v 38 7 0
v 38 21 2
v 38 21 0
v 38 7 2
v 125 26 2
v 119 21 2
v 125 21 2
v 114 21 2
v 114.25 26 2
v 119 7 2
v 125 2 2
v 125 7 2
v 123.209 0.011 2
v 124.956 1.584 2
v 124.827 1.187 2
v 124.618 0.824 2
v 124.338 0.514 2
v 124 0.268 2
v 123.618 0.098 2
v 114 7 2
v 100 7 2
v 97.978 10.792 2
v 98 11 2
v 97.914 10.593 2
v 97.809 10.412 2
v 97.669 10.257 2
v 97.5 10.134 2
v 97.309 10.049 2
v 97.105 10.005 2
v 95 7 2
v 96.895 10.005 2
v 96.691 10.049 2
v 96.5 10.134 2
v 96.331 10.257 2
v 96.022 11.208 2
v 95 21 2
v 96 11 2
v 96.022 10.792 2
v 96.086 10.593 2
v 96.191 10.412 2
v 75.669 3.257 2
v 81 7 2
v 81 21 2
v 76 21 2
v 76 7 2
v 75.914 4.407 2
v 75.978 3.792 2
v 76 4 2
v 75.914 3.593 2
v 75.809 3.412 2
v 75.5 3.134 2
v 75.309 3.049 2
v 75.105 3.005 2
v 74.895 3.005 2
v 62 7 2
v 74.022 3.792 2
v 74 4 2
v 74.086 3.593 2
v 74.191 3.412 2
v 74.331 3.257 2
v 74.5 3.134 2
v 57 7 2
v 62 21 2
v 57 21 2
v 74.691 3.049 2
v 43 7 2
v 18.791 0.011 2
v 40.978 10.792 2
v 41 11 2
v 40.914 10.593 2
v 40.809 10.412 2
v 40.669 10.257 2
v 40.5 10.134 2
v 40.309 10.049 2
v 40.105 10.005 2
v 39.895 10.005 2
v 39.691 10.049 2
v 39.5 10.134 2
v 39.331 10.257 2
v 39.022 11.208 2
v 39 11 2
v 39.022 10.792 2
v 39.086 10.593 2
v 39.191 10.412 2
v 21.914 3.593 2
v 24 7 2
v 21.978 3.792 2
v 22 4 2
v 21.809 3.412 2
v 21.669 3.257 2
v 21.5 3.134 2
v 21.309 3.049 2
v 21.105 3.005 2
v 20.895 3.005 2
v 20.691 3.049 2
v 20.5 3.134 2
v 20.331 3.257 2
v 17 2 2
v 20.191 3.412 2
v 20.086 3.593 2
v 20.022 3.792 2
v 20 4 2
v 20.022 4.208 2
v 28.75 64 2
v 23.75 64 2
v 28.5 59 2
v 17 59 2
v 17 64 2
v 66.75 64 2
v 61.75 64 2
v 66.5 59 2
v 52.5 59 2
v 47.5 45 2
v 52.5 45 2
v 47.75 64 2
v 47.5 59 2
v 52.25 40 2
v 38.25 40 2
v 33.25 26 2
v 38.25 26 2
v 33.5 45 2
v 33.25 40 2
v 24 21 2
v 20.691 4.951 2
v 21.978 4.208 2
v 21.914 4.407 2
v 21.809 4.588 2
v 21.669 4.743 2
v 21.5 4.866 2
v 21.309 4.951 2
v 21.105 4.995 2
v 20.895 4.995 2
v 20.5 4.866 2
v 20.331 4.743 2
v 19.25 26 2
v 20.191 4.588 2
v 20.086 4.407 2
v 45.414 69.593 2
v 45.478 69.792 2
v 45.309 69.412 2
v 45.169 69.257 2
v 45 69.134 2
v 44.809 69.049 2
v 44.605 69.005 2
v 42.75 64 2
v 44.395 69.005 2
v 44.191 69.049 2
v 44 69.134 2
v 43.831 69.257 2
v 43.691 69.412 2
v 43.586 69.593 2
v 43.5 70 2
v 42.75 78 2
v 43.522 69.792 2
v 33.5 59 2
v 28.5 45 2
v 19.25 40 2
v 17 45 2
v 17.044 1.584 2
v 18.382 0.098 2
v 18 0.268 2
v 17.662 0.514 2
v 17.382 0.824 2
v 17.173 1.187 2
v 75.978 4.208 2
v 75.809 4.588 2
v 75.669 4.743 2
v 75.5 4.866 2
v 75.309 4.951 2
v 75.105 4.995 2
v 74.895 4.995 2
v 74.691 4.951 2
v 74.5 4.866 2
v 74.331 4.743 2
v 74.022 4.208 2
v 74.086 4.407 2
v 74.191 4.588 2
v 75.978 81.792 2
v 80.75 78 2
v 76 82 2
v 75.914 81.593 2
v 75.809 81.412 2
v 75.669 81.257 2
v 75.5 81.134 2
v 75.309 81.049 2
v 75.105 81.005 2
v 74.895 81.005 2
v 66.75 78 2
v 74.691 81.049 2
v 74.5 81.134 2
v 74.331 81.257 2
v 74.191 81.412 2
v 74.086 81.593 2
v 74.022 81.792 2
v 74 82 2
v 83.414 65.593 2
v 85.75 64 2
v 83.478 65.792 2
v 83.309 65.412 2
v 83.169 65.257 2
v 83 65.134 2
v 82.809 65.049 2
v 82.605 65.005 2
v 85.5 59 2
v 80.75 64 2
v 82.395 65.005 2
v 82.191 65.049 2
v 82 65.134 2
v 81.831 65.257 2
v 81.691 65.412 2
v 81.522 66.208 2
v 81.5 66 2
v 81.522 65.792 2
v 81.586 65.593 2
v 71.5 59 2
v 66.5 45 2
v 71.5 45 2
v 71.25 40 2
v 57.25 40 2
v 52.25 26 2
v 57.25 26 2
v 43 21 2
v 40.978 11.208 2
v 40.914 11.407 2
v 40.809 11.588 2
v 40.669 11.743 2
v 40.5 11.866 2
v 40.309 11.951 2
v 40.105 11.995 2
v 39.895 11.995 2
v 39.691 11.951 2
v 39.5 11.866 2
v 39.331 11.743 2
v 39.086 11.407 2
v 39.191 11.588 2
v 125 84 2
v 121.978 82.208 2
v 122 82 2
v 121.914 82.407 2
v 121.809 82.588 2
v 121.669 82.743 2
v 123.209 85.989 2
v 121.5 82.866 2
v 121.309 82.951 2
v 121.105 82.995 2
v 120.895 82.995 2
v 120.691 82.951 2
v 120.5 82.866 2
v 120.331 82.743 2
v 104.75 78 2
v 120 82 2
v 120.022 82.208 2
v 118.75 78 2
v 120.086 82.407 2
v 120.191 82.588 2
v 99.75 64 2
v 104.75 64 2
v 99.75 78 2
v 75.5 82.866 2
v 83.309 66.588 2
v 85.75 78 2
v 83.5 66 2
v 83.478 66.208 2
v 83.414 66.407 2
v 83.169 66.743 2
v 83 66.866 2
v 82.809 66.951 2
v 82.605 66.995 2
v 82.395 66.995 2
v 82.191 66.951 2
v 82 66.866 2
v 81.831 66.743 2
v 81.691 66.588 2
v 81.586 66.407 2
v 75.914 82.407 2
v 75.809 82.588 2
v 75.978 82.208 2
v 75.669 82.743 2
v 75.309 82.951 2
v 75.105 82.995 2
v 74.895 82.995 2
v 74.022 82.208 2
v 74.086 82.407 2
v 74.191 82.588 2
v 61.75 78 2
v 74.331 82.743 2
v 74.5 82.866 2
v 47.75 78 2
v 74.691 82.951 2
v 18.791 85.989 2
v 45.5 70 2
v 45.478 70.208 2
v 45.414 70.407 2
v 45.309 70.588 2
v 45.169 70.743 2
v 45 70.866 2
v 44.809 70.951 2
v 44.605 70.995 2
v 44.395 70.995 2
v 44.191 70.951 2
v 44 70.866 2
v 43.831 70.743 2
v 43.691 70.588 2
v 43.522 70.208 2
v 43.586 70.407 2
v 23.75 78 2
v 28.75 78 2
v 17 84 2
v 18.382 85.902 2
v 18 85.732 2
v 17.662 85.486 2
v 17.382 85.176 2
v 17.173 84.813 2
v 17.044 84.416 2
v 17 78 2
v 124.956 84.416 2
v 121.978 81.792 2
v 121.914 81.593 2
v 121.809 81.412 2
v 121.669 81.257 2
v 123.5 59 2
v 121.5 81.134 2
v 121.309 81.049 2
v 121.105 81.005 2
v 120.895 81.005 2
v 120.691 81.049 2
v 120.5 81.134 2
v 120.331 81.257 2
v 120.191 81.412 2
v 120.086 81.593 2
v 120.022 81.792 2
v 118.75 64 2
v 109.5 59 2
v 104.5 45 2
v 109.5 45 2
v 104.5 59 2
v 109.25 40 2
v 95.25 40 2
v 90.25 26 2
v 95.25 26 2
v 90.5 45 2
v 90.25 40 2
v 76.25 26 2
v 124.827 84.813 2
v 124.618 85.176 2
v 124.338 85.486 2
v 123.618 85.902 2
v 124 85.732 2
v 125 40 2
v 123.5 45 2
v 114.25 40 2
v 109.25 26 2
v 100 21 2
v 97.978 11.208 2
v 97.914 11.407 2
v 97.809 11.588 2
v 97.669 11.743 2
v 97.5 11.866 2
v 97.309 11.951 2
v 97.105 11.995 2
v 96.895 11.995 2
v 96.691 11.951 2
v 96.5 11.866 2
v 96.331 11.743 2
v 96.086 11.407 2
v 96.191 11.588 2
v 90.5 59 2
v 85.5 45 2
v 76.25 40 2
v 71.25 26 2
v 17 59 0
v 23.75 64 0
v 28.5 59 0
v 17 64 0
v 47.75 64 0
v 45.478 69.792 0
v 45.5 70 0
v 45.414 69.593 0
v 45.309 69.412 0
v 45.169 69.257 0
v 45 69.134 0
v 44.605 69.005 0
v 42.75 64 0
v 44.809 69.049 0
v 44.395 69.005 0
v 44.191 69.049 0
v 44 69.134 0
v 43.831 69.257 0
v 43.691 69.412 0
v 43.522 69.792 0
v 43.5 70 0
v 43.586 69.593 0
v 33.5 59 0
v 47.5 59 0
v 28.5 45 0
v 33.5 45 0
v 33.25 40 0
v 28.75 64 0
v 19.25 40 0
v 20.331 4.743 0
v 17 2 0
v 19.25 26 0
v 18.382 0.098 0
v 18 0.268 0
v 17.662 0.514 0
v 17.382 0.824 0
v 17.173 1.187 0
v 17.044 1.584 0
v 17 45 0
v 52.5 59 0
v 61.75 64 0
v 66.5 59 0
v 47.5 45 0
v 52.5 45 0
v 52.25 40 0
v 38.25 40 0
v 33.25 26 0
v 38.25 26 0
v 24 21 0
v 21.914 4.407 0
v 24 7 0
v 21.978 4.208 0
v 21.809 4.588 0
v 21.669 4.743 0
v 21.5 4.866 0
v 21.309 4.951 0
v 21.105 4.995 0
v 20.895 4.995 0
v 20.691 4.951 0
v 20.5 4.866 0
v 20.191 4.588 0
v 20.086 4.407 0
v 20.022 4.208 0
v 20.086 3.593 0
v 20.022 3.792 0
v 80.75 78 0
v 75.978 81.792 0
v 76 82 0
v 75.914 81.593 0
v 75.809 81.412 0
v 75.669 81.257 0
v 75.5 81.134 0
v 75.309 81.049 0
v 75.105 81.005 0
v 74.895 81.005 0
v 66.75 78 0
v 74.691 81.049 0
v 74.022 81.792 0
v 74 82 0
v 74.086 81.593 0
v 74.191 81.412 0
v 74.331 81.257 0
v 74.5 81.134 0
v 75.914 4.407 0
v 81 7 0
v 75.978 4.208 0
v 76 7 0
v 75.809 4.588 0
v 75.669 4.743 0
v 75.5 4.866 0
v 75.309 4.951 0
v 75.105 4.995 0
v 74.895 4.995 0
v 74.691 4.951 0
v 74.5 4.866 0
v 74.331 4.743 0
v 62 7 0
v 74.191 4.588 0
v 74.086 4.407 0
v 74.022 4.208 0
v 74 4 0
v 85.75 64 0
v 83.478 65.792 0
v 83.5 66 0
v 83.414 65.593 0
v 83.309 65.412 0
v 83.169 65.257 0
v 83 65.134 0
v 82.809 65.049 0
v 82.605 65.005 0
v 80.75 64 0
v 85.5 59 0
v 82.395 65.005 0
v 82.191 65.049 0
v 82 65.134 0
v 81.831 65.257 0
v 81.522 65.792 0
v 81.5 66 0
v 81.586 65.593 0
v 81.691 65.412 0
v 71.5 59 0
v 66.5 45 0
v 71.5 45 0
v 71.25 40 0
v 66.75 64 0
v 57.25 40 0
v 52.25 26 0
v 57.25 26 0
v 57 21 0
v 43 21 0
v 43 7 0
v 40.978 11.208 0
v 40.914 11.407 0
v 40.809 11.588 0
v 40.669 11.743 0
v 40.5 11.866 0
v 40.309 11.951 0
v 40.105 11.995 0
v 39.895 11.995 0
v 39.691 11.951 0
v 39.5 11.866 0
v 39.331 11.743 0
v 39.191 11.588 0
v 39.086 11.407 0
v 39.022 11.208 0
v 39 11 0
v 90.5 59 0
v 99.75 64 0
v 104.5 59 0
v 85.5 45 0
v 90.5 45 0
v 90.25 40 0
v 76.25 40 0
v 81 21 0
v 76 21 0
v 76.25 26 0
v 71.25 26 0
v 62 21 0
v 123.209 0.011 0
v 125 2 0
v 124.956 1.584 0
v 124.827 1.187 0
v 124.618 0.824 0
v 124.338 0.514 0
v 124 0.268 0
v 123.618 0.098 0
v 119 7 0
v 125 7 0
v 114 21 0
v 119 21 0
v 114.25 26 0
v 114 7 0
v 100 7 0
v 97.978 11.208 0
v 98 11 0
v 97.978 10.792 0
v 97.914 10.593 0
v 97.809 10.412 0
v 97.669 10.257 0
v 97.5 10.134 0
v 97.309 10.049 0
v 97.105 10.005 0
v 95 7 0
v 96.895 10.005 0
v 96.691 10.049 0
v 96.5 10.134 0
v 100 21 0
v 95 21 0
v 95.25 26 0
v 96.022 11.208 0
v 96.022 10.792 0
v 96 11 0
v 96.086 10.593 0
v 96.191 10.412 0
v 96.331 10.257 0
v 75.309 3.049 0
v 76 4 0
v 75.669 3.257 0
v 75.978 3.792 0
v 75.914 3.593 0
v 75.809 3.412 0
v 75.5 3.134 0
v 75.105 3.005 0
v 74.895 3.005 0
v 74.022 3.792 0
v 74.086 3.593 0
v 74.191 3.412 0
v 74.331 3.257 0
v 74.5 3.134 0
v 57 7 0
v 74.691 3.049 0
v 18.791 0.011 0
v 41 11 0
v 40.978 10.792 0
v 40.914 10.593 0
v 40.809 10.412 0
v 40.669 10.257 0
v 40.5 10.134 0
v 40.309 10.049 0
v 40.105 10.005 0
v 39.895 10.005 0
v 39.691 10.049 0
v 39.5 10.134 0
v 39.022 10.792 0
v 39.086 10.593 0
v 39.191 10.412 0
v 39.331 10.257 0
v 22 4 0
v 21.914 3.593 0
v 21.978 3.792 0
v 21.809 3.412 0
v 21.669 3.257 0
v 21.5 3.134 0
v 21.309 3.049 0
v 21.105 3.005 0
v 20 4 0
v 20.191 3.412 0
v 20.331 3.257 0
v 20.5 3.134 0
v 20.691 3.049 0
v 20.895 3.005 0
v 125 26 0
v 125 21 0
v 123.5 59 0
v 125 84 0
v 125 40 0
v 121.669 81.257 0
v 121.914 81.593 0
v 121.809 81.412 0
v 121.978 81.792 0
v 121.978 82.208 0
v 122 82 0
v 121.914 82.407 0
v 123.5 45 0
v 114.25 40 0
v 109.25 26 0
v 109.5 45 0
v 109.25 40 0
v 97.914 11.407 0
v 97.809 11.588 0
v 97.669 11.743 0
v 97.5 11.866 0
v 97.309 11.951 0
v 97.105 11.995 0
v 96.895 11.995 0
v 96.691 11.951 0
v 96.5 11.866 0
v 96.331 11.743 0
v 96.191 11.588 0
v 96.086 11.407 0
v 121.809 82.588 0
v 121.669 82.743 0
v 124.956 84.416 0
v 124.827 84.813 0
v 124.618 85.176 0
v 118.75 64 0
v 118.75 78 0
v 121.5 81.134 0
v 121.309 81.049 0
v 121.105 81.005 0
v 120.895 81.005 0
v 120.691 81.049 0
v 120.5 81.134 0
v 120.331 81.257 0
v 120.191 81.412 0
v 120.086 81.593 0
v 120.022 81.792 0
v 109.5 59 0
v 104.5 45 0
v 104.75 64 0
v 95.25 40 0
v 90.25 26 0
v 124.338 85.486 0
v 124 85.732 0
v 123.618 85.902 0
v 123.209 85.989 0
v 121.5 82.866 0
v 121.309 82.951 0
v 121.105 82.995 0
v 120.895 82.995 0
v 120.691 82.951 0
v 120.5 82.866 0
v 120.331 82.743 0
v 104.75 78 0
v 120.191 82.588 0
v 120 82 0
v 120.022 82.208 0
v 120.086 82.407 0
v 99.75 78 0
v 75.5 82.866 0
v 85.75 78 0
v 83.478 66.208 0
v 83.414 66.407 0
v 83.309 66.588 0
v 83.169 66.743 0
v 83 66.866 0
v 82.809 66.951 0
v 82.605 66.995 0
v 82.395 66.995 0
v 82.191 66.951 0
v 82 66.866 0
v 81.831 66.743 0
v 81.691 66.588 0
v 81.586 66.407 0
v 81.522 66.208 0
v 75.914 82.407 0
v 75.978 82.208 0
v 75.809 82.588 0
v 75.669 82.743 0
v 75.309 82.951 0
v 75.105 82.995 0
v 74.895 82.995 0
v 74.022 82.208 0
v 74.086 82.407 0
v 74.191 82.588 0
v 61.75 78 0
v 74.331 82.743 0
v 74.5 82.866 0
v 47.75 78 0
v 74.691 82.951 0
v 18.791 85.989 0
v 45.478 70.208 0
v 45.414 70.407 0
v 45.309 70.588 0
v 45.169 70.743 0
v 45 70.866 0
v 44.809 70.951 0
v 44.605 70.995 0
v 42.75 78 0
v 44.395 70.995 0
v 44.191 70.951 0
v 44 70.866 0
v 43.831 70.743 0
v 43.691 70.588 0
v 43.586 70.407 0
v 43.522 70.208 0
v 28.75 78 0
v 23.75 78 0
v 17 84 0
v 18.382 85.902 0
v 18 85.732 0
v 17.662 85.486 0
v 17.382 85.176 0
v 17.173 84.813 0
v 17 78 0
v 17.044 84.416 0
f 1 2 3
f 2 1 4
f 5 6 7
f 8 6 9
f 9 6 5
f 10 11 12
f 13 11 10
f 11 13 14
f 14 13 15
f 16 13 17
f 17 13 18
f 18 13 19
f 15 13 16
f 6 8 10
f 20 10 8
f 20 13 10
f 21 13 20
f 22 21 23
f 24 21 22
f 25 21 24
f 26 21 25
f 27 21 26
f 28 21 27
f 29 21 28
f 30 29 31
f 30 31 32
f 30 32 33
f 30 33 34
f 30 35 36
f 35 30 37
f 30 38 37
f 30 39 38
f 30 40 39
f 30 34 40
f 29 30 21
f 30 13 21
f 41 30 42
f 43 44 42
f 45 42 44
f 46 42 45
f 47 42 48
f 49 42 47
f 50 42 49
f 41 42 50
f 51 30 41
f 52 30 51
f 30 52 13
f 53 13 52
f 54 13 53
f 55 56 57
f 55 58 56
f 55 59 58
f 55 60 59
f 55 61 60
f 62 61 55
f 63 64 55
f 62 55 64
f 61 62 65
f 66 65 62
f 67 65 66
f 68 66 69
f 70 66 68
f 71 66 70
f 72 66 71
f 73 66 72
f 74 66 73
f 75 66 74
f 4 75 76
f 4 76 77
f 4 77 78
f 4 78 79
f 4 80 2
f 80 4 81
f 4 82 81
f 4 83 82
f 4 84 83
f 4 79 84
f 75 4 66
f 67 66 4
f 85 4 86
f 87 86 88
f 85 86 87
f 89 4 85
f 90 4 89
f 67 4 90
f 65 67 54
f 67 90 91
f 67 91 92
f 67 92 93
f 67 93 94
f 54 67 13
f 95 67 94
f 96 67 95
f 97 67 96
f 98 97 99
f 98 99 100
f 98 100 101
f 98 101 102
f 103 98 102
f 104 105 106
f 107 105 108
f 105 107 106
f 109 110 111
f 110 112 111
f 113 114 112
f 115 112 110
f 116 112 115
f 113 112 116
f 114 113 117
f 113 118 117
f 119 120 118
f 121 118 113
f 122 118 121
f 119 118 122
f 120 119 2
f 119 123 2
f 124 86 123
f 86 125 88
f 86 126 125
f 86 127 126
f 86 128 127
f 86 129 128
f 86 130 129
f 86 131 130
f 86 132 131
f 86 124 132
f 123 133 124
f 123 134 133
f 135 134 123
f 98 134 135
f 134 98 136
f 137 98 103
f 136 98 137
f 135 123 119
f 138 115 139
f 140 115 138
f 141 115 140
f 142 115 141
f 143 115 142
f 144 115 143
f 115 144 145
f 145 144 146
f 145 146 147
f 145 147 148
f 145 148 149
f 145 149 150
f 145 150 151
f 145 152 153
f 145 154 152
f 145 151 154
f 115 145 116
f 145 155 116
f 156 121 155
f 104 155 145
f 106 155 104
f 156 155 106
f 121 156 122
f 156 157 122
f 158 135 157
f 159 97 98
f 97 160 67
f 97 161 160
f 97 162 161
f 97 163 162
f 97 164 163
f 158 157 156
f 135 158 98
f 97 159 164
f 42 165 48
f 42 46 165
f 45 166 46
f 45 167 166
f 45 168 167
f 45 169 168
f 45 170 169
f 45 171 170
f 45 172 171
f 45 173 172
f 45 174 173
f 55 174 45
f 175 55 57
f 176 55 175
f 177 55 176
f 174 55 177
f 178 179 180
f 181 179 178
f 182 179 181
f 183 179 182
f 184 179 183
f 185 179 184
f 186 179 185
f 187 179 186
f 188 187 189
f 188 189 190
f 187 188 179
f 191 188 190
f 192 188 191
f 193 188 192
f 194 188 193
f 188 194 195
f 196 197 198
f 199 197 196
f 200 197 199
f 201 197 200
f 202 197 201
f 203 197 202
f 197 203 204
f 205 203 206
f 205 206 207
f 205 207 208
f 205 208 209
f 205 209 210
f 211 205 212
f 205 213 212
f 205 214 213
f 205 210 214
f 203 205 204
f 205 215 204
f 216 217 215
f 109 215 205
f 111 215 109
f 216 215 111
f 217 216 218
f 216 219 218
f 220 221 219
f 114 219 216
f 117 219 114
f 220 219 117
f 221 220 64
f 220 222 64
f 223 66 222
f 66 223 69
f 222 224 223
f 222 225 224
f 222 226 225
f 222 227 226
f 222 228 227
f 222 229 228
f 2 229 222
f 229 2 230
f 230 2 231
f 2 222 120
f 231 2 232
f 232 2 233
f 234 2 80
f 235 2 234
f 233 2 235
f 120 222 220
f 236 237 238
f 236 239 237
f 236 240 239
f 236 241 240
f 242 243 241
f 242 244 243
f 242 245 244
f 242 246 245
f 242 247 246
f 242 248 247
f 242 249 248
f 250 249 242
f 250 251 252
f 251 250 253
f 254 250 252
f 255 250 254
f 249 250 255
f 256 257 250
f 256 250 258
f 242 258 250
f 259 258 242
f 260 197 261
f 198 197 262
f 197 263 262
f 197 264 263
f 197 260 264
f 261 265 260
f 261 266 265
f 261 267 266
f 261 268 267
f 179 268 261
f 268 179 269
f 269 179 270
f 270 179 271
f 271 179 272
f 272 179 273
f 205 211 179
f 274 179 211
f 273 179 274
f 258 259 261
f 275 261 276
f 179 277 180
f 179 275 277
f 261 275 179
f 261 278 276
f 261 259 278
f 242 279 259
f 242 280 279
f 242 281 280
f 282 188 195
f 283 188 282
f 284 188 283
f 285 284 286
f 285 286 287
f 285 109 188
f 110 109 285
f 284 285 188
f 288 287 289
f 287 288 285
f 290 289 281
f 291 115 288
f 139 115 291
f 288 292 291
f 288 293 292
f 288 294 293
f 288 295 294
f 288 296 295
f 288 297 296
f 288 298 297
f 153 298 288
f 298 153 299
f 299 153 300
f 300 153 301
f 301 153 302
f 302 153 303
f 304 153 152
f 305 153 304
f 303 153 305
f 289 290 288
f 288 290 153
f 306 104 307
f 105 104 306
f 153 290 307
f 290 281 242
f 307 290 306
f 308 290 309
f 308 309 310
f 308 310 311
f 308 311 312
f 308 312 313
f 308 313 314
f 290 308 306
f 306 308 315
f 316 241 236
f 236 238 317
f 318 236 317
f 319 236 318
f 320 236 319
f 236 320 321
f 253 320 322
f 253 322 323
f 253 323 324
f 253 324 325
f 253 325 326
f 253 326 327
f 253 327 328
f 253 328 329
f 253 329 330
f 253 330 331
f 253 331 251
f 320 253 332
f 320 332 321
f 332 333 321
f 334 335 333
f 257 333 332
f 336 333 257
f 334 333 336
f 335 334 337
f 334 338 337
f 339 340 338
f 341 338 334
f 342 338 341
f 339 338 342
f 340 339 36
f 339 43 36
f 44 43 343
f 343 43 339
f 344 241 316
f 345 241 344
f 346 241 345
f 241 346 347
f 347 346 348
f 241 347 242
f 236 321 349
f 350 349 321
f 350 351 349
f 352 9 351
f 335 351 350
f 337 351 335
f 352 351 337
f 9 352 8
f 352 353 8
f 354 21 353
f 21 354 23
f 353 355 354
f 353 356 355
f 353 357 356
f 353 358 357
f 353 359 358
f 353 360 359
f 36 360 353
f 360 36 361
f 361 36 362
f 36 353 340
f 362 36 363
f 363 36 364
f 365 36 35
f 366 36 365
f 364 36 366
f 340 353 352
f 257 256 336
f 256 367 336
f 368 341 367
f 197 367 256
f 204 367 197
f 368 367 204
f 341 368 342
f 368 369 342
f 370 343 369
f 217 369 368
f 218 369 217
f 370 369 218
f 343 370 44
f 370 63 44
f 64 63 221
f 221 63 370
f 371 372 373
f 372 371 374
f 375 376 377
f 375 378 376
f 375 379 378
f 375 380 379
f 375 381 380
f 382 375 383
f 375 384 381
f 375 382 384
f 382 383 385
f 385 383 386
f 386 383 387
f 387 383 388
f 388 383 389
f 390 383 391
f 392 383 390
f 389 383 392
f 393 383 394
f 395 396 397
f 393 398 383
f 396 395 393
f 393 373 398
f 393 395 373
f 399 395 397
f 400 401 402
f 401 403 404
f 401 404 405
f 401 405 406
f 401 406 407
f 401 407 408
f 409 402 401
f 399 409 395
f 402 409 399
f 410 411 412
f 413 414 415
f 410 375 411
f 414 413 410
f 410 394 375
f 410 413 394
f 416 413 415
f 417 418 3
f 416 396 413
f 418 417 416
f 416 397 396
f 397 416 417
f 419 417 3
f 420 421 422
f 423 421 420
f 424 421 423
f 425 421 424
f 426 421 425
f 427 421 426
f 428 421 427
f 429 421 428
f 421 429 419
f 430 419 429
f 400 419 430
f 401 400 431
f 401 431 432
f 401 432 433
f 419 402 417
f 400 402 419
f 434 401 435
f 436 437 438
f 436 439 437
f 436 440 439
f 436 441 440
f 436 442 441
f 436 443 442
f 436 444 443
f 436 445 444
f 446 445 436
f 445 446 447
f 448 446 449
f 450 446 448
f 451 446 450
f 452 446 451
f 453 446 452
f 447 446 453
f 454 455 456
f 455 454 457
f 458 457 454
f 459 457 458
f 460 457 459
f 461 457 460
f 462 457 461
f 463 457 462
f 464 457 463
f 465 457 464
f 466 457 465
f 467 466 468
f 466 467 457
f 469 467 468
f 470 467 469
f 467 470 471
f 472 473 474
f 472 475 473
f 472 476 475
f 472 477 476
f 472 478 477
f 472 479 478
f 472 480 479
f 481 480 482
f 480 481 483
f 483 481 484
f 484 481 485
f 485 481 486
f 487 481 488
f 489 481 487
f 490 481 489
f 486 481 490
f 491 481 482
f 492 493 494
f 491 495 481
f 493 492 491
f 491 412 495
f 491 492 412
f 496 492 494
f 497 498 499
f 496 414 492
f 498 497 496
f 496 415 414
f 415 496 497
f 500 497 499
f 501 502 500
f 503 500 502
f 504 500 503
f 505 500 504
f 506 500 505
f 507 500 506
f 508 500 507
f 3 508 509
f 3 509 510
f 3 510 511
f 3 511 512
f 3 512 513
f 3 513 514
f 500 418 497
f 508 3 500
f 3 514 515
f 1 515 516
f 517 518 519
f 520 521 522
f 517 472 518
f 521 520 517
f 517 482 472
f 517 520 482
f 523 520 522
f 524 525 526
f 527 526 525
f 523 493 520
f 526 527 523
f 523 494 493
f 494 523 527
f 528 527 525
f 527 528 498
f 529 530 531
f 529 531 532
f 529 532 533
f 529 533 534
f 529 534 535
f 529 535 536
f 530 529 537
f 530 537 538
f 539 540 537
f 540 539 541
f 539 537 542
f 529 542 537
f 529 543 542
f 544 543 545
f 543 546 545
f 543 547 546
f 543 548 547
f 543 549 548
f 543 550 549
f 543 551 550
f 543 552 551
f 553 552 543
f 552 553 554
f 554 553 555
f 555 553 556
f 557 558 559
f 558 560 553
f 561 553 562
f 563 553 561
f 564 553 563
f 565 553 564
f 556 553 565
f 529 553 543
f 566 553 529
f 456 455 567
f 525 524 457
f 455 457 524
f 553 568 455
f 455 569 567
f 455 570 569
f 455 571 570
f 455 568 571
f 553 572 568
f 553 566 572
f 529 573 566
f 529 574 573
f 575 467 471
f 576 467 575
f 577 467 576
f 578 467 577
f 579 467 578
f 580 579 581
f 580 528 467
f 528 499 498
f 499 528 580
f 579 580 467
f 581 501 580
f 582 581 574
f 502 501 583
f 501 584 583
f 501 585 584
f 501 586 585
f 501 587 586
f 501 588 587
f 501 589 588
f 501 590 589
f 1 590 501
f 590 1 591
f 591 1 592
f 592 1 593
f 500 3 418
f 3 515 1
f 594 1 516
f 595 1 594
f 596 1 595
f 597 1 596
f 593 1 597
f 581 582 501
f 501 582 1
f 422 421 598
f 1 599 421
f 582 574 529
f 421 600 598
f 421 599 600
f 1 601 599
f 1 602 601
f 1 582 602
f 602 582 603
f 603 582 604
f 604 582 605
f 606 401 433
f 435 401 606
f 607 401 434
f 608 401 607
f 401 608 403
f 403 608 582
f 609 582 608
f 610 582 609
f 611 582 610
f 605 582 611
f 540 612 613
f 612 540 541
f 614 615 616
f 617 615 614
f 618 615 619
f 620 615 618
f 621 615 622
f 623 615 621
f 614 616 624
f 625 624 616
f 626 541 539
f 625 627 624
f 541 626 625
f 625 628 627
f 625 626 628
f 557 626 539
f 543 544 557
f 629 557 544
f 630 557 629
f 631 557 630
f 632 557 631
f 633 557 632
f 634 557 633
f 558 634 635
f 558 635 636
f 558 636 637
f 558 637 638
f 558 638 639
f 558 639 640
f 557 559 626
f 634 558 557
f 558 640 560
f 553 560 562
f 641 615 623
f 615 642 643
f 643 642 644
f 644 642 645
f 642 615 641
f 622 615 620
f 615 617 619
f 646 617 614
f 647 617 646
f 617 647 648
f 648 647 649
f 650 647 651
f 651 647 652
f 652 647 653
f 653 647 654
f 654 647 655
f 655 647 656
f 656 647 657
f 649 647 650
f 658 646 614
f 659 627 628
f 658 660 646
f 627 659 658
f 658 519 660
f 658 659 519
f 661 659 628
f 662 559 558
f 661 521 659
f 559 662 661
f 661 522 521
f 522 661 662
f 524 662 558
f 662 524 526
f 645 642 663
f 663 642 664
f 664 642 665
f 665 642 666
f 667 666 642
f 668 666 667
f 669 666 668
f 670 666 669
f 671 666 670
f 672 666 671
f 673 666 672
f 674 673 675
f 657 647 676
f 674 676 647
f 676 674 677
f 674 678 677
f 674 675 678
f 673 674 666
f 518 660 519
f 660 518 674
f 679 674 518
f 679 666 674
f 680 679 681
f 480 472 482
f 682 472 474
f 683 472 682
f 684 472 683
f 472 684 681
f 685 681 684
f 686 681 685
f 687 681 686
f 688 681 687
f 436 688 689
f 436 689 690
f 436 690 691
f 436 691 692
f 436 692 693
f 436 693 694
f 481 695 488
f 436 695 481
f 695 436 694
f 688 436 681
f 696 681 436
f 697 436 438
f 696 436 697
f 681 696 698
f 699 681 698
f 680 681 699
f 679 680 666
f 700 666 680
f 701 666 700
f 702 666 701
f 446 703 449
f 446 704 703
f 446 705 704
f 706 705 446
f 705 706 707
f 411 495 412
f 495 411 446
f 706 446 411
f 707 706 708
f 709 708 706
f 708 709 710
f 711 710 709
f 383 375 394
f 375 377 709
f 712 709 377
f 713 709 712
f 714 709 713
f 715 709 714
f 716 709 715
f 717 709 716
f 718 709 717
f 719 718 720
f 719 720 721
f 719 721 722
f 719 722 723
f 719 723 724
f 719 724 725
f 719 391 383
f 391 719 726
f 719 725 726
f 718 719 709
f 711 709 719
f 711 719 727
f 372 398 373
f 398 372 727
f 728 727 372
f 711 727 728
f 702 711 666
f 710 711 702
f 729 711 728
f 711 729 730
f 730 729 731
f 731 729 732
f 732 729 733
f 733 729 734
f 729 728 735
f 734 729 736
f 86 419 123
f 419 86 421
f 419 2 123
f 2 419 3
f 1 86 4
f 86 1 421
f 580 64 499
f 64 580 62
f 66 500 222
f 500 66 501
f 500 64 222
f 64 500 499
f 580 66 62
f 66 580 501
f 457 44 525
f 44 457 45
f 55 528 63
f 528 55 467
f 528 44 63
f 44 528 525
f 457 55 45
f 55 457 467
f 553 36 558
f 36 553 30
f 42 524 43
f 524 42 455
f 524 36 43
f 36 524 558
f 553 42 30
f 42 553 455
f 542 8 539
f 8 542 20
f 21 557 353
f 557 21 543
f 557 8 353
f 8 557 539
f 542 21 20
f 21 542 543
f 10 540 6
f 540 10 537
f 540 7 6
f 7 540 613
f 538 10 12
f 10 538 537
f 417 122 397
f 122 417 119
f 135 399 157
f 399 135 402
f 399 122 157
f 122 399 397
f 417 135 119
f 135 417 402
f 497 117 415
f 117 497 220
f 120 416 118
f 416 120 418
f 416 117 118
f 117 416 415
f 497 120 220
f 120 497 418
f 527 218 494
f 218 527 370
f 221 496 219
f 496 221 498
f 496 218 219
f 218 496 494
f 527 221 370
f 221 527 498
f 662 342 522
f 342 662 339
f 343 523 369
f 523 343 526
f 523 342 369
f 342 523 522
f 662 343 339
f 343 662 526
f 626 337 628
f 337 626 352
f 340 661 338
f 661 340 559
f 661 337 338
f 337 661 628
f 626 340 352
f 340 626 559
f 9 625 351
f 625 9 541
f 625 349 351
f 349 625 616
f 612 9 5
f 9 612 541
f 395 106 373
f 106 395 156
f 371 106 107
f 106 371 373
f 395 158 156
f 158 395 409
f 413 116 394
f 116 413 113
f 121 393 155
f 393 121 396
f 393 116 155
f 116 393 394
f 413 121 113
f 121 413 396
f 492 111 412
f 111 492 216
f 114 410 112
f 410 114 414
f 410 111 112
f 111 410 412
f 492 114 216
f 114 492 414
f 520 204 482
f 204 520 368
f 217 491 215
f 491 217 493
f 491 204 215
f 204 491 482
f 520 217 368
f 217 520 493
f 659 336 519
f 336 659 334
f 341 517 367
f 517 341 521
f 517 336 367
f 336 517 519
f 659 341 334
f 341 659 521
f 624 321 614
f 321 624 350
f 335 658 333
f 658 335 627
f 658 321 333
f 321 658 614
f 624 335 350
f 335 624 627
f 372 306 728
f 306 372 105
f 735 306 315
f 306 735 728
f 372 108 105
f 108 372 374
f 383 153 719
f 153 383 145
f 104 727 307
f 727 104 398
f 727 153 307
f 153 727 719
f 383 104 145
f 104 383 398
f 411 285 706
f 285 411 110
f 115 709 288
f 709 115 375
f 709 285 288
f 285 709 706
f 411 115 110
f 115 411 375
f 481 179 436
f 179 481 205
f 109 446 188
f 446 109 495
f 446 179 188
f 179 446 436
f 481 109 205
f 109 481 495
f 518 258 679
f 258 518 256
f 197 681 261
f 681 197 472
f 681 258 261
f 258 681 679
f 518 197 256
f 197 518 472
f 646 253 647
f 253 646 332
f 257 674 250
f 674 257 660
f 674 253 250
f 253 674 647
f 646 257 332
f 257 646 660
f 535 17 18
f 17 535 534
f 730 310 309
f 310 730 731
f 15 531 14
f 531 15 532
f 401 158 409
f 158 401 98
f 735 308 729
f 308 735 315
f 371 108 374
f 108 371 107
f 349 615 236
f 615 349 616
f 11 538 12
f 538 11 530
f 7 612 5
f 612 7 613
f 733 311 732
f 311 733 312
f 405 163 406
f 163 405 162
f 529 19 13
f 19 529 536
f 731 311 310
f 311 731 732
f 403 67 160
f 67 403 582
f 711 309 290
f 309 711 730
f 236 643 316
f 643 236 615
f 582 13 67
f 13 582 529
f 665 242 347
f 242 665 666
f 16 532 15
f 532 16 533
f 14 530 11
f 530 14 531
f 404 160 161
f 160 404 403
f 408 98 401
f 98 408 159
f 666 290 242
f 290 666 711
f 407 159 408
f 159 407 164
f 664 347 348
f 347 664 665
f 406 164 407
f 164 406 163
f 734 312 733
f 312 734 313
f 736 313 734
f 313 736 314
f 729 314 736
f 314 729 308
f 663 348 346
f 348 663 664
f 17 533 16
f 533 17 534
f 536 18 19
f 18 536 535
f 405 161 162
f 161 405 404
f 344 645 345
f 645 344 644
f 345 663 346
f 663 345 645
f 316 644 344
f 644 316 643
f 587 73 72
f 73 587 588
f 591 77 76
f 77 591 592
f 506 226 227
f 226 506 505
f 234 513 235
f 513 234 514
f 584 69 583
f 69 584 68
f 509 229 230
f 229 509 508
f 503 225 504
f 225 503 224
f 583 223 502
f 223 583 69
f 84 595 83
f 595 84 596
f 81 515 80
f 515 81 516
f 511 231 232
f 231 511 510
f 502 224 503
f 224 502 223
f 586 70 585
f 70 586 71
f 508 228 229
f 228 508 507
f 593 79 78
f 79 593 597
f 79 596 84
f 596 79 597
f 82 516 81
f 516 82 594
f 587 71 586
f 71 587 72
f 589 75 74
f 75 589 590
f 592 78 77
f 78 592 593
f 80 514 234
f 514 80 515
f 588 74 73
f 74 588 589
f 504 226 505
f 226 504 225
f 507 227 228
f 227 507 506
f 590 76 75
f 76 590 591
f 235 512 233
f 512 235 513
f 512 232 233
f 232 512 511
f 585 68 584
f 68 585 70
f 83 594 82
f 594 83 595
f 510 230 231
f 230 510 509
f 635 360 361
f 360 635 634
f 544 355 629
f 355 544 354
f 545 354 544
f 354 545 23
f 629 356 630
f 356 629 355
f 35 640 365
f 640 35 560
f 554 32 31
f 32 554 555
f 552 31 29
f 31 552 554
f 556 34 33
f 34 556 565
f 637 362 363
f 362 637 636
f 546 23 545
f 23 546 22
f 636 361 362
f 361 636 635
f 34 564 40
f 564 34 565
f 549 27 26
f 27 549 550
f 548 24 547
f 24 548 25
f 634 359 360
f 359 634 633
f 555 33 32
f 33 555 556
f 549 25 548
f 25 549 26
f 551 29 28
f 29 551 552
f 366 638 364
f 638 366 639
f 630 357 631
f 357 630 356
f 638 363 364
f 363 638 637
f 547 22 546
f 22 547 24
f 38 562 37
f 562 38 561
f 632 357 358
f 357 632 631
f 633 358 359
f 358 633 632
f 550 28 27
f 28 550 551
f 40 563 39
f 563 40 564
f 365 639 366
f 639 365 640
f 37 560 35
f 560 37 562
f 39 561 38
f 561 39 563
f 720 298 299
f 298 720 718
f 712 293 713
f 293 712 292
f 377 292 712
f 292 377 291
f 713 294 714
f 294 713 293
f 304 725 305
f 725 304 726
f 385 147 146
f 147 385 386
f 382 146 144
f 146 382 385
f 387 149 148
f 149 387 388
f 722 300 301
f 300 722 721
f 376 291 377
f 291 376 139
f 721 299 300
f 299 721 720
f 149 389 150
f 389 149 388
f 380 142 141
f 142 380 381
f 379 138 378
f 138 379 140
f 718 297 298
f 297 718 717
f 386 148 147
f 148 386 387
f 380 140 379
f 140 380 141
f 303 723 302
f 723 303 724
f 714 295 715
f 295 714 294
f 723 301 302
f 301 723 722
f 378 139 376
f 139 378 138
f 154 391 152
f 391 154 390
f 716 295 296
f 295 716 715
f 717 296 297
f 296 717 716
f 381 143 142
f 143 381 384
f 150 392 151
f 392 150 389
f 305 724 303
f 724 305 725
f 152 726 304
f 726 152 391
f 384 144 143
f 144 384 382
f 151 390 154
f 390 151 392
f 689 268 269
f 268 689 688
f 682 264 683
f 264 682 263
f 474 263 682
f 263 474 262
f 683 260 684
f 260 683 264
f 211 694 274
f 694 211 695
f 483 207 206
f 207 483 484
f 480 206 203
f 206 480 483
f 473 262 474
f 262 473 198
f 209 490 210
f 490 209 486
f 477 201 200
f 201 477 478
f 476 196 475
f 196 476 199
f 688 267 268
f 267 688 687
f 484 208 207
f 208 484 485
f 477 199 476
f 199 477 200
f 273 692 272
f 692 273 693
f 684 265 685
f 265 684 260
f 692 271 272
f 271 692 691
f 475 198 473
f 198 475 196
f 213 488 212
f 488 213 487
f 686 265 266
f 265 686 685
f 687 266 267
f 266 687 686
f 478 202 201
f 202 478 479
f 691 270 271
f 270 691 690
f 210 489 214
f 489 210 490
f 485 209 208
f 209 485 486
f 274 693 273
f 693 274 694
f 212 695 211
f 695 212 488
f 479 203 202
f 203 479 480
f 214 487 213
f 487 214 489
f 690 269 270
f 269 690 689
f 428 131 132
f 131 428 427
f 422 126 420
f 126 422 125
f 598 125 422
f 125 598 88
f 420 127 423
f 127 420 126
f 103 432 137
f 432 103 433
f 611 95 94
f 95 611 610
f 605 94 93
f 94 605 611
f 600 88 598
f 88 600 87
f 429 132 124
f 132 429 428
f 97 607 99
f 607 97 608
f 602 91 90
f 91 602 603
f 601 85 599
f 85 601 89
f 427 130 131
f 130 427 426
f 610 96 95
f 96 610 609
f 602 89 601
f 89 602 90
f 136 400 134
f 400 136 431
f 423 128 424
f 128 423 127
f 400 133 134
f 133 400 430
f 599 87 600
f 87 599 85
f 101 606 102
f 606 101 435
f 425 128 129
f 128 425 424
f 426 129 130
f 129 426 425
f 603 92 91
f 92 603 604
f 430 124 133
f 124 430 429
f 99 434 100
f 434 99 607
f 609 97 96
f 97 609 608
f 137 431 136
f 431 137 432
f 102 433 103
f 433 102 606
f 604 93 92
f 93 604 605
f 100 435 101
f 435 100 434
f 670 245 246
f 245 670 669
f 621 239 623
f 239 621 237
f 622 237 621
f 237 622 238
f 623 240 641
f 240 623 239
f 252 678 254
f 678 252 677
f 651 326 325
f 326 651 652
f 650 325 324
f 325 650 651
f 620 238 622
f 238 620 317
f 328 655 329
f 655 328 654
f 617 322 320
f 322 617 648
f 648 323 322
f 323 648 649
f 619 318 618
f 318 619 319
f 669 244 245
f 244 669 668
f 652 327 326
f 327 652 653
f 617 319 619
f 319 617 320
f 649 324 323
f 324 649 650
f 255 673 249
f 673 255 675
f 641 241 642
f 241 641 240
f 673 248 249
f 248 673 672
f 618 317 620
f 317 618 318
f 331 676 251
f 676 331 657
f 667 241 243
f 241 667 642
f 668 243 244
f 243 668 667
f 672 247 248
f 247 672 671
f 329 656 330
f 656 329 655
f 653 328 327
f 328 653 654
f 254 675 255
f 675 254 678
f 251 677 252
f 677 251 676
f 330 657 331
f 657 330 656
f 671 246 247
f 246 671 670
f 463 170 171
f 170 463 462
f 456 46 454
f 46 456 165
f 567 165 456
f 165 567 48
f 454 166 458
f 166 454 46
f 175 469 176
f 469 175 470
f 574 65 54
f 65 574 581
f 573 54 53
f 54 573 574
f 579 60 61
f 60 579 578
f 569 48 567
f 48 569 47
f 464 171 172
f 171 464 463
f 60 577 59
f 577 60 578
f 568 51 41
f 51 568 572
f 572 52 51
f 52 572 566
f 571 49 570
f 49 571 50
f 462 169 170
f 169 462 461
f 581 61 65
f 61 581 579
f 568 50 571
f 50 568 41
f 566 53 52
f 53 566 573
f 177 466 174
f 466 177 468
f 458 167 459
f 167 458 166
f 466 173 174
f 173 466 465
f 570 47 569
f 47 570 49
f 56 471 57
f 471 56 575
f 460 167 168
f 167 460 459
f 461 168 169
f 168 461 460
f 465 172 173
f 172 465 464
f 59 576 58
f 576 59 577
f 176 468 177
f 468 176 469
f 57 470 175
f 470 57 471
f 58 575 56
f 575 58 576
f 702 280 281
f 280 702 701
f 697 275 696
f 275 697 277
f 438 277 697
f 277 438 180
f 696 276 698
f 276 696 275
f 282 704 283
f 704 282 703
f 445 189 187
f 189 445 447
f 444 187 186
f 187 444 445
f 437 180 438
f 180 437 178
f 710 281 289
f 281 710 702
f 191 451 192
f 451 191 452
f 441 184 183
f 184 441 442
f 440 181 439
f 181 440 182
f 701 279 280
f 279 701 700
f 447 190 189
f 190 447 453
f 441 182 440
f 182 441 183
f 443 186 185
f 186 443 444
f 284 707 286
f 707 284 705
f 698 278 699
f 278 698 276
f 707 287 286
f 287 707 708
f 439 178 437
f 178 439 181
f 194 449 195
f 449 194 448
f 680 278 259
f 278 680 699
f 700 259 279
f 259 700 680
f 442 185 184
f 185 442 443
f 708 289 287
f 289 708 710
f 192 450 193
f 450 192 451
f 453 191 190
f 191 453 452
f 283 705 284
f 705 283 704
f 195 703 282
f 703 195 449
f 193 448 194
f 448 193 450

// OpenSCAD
$fs = 0.1;
height = 1;

// 縦、幅+3mmずつ + minkowskiで+2mm = 5mm?

module tri(h) {
    polyhedron([[0, 0, 0], [0, 82, 0], [-17, 82, 0], [-17, 82, h], [0, 82, h], [0, 0, h]],
    [[0, 1, 2], [5, 4, 3], [0, 2, 3, 5], [0, 1, 4, 5], [1, 2, 3, 4]]);
};

module hole(x, y, h) {
    translate([x, y, 0])
        cylinder(r=1, h=h+1);
};

module cherry_hole(x, y, h) {
    translate([x, y, 0])
        cube([14, 14, h+1]);
}

translate([19, 2, 0])
    difference() {
        minkowski() {
            union() {
                    cube([104, 82, height]);
                    tri(height);
                    rotate([180, 180, 0])
                        translate([-104, -82, 0])
                            tri(height);
            };
            cylinder(r=2, h=height);
        };
        
        //key
        for(i = [0:3]) {
            translate([-i*4.75, 14*i+5*i, 0])
            for(j = [0:5]) {
                if(j == 0) {
                    cherry_hole(14*j+2+3, 2+3, height);
                } else {
                    cherry_hole(14*j+j*5+2+3, 2+3, height);
                }
            }
        }
        
        //基板
        hole(19+2, 7+2, height);
        hole(76+2, 7+2, height);
        hole(23.5+2, 66+2, height);
        hole(61.5+2, 104-38-2, height);
        
        //外周
        hole(2, 2, height);
        hole(104-2, 82-2, height);
        hole(2-17, 82-2, height);
        hole(104+17-2, 2, height);
        hole(109+2, 41-2, height);
        hole(2-8, 41-2, height);
        hole(54+2, 2, height);
        hole(54+2, 82-2, height);
    };
